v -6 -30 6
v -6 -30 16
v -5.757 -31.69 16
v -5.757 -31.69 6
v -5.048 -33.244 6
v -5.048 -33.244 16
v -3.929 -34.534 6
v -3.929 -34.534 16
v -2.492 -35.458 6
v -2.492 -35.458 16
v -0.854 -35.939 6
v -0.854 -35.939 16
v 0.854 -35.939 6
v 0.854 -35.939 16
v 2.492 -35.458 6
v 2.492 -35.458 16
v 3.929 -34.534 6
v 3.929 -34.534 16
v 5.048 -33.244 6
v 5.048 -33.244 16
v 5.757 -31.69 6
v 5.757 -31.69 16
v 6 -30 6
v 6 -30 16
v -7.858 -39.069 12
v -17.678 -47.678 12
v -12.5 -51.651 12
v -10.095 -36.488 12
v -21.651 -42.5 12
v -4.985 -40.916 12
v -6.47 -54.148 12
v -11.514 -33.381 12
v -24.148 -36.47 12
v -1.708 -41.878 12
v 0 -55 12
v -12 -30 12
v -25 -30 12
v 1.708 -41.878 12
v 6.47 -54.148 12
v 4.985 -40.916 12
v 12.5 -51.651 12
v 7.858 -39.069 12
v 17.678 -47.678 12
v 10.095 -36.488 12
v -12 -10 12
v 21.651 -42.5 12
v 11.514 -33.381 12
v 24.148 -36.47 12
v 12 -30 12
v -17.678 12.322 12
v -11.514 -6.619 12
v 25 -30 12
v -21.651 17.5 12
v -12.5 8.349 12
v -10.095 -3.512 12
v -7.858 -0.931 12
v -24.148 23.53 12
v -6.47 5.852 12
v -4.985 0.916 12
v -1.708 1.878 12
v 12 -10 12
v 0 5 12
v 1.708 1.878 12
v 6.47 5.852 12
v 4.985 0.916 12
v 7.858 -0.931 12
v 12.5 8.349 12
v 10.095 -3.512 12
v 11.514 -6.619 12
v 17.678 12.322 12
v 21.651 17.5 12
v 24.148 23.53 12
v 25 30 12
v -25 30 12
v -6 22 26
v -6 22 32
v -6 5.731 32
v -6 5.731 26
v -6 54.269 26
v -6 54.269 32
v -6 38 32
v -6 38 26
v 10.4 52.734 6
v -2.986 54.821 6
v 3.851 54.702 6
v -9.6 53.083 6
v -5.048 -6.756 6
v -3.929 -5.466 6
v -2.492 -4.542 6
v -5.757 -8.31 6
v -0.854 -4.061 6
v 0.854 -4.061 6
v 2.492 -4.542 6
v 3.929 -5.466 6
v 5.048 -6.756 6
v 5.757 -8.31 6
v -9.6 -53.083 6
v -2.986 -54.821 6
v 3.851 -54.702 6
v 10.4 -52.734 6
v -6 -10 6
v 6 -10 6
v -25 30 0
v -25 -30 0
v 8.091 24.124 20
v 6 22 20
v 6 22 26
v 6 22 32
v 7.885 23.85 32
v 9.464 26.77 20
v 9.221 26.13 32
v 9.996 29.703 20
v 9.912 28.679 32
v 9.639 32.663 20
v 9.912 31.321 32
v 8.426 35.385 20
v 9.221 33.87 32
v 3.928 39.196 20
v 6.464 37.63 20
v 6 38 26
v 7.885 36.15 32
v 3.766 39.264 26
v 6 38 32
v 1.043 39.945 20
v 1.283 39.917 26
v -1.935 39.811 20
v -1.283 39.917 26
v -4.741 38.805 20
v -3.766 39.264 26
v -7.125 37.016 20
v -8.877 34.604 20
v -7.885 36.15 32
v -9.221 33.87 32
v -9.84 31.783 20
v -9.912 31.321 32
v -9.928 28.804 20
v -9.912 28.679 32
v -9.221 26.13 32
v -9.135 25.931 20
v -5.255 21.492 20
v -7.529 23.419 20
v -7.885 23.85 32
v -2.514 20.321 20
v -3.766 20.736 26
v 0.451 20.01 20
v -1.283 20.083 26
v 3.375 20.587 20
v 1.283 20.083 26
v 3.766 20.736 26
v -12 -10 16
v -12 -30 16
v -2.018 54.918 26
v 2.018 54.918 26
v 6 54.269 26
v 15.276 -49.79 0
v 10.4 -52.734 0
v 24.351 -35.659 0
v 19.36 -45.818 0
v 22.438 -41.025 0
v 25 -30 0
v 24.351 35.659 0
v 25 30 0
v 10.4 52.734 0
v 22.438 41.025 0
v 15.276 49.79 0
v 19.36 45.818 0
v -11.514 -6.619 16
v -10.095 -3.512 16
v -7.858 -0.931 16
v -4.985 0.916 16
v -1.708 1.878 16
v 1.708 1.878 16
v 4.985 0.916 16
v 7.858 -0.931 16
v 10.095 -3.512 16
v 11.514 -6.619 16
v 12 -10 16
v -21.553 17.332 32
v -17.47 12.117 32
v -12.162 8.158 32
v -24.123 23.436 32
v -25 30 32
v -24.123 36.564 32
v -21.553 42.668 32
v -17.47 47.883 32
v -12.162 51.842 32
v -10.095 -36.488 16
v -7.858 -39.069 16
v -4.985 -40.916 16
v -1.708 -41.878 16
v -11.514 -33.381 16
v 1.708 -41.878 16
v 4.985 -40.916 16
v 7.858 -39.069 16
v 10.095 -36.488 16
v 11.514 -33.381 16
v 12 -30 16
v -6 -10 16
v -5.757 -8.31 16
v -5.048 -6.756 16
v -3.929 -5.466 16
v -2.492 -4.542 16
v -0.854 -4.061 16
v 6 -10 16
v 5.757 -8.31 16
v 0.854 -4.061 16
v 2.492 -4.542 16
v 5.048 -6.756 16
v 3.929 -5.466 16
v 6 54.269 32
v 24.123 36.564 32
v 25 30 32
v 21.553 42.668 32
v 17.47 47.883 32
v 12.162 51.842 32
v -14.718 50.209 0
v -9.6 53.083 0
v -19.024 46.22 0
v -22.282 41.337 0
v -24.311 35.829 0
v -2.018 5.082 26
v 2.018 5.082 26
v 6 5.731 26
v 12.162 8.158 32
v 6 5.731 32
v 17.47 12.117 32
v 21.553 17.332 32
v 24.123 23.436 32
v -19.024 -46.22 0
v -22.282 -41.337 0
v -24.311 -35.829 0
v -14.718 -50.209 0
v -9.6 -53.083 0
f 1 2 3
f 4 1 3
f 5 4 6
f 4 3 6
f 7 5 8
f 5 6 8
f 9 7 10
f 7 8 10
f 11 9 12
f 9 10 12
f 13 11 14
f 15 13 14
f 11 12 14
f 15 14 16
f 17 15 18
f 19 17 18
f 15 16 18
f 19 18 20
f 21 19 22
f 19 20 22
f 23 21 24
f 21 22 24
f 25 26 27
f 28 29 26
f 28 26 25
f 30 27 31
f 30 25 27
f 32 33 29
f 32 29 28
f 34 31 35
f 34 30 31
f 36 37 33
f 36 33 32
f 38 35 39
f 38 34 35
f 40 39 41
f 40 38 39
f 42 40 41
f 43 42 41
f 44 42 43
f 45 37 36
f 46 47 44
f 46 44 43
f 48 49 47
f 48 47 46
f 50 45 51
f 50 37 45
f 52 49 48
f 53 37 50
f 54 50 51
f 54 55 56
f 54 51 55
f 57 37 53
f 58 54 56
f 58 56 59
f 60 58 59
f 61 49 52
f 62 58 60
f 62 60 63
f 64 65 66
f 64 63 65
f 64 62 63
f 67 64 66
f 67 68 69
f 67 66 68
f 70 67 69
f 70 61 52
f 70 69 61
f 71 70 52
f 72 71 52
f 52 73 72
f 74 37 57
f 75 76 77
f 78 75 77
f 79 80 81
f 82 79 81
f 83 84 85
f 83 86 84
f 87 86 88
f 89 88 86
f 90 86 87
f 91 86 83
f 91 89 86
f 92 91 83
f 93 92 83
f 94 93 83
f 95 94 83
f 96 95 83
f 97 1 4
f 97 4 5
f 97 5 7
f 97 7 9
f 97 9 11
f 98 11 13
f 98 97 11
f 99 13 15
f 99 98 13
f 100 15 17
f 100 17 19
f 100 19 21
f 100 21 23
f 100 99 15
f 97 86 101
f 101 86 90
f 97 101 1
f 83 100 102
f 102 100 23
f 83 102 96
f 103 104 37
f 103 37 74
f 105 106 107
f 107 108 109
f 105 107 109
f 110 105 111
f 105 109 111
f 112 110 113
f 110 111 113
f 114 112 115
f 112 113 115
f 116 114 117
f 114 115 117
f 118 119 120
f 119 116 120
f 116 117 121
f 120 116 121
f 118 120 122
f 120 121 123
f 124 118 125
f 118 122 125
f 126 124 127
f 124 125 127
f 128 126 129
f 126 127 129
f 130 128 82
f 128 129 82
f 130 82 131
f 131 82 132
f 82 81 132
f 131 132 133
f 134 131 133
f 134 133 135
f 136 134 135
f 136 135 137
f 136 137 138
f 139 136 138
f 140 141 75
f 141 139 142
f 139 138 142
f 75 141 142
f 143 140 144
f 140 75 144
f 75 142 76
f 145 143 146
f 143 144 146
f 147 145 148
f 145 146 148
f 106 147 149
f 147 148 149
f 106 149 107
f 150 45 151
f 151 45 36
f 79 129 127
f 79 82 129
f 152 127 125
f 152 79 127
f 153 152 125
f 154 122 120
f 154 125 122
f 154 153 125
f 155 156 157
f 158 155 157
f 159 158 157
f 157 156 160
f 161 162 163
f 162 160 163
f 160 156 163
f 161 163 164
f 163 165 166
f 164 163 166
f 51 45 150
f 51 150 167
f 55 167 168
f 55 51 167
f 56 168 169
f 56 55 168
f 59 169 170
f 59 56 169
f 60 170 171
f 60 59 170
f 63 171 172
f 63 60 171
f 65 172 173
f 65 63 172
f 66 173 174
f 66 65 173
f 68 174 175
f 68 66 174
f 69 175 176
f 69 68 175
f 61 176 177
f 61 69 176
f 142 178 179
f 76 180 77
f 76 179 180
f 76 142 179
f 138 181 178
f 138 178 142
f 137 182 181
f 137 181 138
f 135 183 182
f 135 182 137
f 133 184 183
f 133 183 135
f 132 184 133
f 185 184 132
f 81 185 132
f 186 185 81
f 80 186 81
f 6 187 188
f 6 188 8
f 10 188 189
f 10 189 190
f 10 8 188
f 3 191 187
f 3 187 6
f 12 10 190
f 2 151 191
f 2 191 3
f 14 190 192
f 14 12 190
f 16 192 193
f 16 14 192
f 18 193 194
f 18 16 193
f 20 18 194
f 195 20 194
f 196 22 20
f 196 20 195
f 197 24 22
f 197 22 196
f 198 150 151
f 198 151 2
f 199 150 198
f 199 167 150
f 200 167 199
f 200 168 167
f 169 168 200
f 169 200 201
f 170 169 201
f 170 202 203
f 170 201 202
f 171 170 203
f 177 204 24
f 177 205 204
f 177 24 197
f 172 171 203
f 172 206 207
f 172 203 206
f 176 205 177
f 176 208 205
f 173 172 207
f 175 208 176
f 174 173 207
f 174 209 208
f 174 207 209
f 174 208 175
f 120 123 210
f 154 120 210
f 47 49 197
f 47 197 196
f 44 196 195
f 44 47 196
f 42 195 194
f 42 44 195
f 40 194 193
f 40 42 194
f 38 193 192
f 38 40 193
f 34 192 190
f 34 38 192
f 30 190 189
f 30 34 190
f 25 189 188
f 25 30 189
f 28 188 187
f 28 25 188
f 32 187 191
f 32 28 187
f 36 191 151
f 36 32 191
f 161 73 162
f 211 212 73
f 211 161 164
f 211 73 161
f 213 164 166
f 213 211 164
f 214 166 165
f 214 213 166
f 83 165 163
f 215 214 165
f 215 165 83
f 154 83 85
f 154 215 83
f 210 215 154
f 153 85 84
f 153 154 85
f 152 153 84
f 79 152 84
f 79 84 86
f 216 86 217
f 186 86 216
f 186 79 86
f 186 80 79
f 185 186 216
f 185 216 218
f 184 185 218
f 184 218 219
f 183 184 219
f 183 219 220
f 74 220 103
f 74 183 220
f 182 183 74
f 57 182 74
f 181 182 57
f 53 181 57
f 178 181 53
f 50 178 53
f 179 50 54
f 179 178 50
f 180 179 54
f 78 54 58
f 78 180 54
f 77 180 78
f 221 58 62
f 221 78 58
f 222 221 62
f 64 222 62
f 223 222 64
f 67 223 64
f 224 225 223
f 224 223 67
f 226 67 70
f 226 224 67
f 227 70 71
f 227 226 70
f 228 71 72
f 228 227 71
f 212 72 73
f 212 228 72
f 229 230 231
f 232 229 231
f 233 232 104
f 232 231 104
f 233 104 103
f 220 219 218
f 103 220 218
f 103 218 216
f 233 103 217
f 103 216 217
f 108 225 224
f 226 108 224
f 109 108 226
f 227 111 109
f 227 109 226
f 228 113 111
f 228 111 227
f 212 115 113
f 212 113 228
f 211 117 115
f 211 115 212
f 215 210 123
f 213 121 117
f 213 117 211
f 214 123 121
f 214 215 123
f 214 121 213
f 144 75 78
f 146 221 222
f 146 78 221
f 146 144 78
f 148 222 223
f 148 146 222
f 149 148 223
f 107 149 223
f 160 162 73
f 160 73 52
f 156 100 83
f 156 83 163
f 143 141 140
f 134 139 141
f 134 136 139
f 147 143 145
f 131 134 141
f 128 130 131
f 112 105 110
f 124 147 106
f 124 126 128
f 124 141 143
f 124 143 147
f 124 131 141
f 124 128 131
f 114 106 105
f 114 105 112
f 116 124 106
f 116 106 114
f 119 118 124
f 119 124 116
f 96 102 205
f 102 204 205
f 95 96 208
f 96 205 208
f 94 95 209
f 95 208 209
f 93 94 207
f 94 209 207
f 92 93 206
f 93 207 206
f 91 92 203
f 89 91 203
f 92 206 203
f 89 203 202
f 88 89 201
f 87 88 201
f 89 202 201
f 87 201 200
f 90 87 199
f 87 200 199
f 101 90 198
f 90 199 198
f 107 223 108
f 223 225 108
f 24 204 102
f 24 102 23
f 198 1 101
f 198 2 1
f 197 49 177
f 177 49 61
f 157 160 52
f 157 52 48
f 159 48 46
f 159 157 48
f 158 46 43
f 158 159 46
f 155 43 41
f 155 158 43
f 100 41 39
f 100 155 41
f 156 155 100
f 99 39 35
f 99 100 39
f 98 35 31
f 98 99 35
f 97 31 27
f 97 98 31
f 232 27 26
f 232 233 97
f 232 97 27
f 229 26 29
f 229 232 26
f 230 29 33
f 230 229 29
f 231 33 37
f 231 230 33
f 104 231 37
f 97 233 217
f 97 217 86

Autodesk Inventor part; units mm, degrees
ref_plane "YZ Plane" through (0, 0, 0) normal (1, 0, 0) x (0, 1, 0)
ref_plane "XZ Plane" through (0, 0, 0) normal (0, 1, 0) x (-1, 0, 0)
ref_plane "XY Plane" through (0, 0, 0) normal (0, 0, 1) x (1, 0, 0)
sketch "Sketch1" plane through (0, 0, 0) normal (0, 0, 1) x (1, 0, 0)
  line L0 (-25, 30) -> (25, 30)
  line L1 (25, 30) -> (25, -30)
  line L2 (25, -30) -> (-25, -30)
  line L3 (-25, -30) -> (-25, 30)
  line L4 (-25, 30) -> (25, -30) construction
  line L5 (25, 30) -> (-25, -30) construction
  arc A0 (-25, -30) -> (25, -30) centre (0, -30) ccw
  point P0 (0, 0)
  dimension "d0" = 50
  dimension "d1" = 60
  dimension "d2" = 25
extrude "Extrusion1" add sketch "Sketch1" along normal blind 12
sketch "Sketch2" plane through (0, 0, 12) normal (0, 0, 1) x (1, 0, 0)
  line L0 (25, 30) -> (-25, 30) projected
  circle A0 centre (0, 30) radius 25
  point P0 (0, 0)
  dimension "d5" = 50
extrude "Extrusion2" add sketch "Sketch2" along normal blind 20 and the other way blind 12
sketch "Sketch3" plane through (0, 30, 32) normal (0, 0, 1) x (1, 0, 0)
  line L0 (-6, -25) -> (6, -25)
  line L1 (6, 25) -> (-6, 25)
  line L2 (-6, -25) -> (6, 25) construction
  line L3 (6, -25) -> (-6, 25) construction
  line L4 (-6, 25) -> (-6, 8)
  line L5 (-6, -8) -> (-6, -25)
  line L6 (6, -25) -> (6, -8)
  line L7 (6, 8) -> (6, 25)
  arc A0 (-6, 8) -> (-6, -8) centre (0, 0) ccw
  arc A1 (6, -8) -> (6, 8) centre (0, 0) ccw
  point P0 (0, -30)
  dimension "d11" = 12
  dimension "d12" = 50
extrude "Extrusion3" cut sketch "Sketch3" against normal blind 6
sketch "Sketch4" plane through (0, 30, 26) normal (0, 0, 1) x (1, 0, 0)
  arc A0 (6, -8) -> (6, 8) centre (0, 0) ccw projected
  circle A1 centre (0, 0) radius 10
  point P0 (0, -30)
  point P1 (6, 8)
  point P2 (6, -8)
  dimension "d15" = 20
extrude "Extrusion4" cut sketch "Sketch4" against normal blind 6
sketch "Sketch5" plane through (0, 0, 12) normal (0, 0, 1) x (1, 0, 0)
  arc A0 (-25, -30) -> (25, -30) centre (0, -30) ccw projected
  line L0 (0, -30) -> (0, -10) construction
  line L1 (12, -30) -> (12, -10)
  line L2 (-12, -10) -> (-12, -30)
  arc A1 (-12, -30) -> (12, -30) centre (0, -30) ccw
  arc A2 (12, -10) -> (-12, -10) centre (0, -10) ccw
  line L3 (-6, -10) -> (-6, -30)
  arc A3 (-6, -30) -> (6, -30) centre (0, -30) ccw
  line L4 (6, -30) -> (6, -10)
  arc A4 (6, -10) -> (-6, -10) centre (0, -10) ccw
  point P0 (0, 0)
  point P1 (0, -20)
  dimension "d21" = 12
  dimension "d22" = 6
extrude "Extrusion5" add sketch "Sketch5" along normal blind 4
sketch "Sketch6" plane through (0, 0, 0) normal (0, 1, 0) x (-1, 0, 0)
  line L0 (-25, 0) -> (25, 0) projected
  line L1 (-10.3999, 0) -> (9.6001, 0)
  line L2 (9.6001, 0) -> (9.6001, 6)
  line L3 (9.6001, 6) -> (-10.3999, 6)
  line L4 (-10.3999, 6) -> (-10.3999, 0)
  point P0 (0, 0)
  point P1 (9.6001, 0)
  dimension "d25" = 20
  dimension "d26" = 6
extrude "Extrusion6" cut sketch "Sketch6" along normal blind 60 and the other way blind 60
sketch "Sketch7" plane through (0, 0, 12) normal (0, 0, 1) x (1, 0, 0)
  arc A0 (6, -10) -> (-6, -10) centre (0, -10) ccw projected
  line L0 (0, -4) -> (0, -36) construction
  arc A1 (-6, -30) -> (6, -30) centre (0, -30) ccw projected
  line L1 (6, -10) -> (6, -30)
  line L2 (-6, -30) -> (-6, -10)
  arc A2 (6, -10) -> (-6, -10) centre (0, -10) ccw
  arc A3 (-6, -30) -> (6, -30) centre (0, -30) ccw
  point P0 (0, 0)
  point P1 (0, -20)
extrude "Extrusion7" cut sketch "Sketch7" against normal through all
properties part number "cad@67"
